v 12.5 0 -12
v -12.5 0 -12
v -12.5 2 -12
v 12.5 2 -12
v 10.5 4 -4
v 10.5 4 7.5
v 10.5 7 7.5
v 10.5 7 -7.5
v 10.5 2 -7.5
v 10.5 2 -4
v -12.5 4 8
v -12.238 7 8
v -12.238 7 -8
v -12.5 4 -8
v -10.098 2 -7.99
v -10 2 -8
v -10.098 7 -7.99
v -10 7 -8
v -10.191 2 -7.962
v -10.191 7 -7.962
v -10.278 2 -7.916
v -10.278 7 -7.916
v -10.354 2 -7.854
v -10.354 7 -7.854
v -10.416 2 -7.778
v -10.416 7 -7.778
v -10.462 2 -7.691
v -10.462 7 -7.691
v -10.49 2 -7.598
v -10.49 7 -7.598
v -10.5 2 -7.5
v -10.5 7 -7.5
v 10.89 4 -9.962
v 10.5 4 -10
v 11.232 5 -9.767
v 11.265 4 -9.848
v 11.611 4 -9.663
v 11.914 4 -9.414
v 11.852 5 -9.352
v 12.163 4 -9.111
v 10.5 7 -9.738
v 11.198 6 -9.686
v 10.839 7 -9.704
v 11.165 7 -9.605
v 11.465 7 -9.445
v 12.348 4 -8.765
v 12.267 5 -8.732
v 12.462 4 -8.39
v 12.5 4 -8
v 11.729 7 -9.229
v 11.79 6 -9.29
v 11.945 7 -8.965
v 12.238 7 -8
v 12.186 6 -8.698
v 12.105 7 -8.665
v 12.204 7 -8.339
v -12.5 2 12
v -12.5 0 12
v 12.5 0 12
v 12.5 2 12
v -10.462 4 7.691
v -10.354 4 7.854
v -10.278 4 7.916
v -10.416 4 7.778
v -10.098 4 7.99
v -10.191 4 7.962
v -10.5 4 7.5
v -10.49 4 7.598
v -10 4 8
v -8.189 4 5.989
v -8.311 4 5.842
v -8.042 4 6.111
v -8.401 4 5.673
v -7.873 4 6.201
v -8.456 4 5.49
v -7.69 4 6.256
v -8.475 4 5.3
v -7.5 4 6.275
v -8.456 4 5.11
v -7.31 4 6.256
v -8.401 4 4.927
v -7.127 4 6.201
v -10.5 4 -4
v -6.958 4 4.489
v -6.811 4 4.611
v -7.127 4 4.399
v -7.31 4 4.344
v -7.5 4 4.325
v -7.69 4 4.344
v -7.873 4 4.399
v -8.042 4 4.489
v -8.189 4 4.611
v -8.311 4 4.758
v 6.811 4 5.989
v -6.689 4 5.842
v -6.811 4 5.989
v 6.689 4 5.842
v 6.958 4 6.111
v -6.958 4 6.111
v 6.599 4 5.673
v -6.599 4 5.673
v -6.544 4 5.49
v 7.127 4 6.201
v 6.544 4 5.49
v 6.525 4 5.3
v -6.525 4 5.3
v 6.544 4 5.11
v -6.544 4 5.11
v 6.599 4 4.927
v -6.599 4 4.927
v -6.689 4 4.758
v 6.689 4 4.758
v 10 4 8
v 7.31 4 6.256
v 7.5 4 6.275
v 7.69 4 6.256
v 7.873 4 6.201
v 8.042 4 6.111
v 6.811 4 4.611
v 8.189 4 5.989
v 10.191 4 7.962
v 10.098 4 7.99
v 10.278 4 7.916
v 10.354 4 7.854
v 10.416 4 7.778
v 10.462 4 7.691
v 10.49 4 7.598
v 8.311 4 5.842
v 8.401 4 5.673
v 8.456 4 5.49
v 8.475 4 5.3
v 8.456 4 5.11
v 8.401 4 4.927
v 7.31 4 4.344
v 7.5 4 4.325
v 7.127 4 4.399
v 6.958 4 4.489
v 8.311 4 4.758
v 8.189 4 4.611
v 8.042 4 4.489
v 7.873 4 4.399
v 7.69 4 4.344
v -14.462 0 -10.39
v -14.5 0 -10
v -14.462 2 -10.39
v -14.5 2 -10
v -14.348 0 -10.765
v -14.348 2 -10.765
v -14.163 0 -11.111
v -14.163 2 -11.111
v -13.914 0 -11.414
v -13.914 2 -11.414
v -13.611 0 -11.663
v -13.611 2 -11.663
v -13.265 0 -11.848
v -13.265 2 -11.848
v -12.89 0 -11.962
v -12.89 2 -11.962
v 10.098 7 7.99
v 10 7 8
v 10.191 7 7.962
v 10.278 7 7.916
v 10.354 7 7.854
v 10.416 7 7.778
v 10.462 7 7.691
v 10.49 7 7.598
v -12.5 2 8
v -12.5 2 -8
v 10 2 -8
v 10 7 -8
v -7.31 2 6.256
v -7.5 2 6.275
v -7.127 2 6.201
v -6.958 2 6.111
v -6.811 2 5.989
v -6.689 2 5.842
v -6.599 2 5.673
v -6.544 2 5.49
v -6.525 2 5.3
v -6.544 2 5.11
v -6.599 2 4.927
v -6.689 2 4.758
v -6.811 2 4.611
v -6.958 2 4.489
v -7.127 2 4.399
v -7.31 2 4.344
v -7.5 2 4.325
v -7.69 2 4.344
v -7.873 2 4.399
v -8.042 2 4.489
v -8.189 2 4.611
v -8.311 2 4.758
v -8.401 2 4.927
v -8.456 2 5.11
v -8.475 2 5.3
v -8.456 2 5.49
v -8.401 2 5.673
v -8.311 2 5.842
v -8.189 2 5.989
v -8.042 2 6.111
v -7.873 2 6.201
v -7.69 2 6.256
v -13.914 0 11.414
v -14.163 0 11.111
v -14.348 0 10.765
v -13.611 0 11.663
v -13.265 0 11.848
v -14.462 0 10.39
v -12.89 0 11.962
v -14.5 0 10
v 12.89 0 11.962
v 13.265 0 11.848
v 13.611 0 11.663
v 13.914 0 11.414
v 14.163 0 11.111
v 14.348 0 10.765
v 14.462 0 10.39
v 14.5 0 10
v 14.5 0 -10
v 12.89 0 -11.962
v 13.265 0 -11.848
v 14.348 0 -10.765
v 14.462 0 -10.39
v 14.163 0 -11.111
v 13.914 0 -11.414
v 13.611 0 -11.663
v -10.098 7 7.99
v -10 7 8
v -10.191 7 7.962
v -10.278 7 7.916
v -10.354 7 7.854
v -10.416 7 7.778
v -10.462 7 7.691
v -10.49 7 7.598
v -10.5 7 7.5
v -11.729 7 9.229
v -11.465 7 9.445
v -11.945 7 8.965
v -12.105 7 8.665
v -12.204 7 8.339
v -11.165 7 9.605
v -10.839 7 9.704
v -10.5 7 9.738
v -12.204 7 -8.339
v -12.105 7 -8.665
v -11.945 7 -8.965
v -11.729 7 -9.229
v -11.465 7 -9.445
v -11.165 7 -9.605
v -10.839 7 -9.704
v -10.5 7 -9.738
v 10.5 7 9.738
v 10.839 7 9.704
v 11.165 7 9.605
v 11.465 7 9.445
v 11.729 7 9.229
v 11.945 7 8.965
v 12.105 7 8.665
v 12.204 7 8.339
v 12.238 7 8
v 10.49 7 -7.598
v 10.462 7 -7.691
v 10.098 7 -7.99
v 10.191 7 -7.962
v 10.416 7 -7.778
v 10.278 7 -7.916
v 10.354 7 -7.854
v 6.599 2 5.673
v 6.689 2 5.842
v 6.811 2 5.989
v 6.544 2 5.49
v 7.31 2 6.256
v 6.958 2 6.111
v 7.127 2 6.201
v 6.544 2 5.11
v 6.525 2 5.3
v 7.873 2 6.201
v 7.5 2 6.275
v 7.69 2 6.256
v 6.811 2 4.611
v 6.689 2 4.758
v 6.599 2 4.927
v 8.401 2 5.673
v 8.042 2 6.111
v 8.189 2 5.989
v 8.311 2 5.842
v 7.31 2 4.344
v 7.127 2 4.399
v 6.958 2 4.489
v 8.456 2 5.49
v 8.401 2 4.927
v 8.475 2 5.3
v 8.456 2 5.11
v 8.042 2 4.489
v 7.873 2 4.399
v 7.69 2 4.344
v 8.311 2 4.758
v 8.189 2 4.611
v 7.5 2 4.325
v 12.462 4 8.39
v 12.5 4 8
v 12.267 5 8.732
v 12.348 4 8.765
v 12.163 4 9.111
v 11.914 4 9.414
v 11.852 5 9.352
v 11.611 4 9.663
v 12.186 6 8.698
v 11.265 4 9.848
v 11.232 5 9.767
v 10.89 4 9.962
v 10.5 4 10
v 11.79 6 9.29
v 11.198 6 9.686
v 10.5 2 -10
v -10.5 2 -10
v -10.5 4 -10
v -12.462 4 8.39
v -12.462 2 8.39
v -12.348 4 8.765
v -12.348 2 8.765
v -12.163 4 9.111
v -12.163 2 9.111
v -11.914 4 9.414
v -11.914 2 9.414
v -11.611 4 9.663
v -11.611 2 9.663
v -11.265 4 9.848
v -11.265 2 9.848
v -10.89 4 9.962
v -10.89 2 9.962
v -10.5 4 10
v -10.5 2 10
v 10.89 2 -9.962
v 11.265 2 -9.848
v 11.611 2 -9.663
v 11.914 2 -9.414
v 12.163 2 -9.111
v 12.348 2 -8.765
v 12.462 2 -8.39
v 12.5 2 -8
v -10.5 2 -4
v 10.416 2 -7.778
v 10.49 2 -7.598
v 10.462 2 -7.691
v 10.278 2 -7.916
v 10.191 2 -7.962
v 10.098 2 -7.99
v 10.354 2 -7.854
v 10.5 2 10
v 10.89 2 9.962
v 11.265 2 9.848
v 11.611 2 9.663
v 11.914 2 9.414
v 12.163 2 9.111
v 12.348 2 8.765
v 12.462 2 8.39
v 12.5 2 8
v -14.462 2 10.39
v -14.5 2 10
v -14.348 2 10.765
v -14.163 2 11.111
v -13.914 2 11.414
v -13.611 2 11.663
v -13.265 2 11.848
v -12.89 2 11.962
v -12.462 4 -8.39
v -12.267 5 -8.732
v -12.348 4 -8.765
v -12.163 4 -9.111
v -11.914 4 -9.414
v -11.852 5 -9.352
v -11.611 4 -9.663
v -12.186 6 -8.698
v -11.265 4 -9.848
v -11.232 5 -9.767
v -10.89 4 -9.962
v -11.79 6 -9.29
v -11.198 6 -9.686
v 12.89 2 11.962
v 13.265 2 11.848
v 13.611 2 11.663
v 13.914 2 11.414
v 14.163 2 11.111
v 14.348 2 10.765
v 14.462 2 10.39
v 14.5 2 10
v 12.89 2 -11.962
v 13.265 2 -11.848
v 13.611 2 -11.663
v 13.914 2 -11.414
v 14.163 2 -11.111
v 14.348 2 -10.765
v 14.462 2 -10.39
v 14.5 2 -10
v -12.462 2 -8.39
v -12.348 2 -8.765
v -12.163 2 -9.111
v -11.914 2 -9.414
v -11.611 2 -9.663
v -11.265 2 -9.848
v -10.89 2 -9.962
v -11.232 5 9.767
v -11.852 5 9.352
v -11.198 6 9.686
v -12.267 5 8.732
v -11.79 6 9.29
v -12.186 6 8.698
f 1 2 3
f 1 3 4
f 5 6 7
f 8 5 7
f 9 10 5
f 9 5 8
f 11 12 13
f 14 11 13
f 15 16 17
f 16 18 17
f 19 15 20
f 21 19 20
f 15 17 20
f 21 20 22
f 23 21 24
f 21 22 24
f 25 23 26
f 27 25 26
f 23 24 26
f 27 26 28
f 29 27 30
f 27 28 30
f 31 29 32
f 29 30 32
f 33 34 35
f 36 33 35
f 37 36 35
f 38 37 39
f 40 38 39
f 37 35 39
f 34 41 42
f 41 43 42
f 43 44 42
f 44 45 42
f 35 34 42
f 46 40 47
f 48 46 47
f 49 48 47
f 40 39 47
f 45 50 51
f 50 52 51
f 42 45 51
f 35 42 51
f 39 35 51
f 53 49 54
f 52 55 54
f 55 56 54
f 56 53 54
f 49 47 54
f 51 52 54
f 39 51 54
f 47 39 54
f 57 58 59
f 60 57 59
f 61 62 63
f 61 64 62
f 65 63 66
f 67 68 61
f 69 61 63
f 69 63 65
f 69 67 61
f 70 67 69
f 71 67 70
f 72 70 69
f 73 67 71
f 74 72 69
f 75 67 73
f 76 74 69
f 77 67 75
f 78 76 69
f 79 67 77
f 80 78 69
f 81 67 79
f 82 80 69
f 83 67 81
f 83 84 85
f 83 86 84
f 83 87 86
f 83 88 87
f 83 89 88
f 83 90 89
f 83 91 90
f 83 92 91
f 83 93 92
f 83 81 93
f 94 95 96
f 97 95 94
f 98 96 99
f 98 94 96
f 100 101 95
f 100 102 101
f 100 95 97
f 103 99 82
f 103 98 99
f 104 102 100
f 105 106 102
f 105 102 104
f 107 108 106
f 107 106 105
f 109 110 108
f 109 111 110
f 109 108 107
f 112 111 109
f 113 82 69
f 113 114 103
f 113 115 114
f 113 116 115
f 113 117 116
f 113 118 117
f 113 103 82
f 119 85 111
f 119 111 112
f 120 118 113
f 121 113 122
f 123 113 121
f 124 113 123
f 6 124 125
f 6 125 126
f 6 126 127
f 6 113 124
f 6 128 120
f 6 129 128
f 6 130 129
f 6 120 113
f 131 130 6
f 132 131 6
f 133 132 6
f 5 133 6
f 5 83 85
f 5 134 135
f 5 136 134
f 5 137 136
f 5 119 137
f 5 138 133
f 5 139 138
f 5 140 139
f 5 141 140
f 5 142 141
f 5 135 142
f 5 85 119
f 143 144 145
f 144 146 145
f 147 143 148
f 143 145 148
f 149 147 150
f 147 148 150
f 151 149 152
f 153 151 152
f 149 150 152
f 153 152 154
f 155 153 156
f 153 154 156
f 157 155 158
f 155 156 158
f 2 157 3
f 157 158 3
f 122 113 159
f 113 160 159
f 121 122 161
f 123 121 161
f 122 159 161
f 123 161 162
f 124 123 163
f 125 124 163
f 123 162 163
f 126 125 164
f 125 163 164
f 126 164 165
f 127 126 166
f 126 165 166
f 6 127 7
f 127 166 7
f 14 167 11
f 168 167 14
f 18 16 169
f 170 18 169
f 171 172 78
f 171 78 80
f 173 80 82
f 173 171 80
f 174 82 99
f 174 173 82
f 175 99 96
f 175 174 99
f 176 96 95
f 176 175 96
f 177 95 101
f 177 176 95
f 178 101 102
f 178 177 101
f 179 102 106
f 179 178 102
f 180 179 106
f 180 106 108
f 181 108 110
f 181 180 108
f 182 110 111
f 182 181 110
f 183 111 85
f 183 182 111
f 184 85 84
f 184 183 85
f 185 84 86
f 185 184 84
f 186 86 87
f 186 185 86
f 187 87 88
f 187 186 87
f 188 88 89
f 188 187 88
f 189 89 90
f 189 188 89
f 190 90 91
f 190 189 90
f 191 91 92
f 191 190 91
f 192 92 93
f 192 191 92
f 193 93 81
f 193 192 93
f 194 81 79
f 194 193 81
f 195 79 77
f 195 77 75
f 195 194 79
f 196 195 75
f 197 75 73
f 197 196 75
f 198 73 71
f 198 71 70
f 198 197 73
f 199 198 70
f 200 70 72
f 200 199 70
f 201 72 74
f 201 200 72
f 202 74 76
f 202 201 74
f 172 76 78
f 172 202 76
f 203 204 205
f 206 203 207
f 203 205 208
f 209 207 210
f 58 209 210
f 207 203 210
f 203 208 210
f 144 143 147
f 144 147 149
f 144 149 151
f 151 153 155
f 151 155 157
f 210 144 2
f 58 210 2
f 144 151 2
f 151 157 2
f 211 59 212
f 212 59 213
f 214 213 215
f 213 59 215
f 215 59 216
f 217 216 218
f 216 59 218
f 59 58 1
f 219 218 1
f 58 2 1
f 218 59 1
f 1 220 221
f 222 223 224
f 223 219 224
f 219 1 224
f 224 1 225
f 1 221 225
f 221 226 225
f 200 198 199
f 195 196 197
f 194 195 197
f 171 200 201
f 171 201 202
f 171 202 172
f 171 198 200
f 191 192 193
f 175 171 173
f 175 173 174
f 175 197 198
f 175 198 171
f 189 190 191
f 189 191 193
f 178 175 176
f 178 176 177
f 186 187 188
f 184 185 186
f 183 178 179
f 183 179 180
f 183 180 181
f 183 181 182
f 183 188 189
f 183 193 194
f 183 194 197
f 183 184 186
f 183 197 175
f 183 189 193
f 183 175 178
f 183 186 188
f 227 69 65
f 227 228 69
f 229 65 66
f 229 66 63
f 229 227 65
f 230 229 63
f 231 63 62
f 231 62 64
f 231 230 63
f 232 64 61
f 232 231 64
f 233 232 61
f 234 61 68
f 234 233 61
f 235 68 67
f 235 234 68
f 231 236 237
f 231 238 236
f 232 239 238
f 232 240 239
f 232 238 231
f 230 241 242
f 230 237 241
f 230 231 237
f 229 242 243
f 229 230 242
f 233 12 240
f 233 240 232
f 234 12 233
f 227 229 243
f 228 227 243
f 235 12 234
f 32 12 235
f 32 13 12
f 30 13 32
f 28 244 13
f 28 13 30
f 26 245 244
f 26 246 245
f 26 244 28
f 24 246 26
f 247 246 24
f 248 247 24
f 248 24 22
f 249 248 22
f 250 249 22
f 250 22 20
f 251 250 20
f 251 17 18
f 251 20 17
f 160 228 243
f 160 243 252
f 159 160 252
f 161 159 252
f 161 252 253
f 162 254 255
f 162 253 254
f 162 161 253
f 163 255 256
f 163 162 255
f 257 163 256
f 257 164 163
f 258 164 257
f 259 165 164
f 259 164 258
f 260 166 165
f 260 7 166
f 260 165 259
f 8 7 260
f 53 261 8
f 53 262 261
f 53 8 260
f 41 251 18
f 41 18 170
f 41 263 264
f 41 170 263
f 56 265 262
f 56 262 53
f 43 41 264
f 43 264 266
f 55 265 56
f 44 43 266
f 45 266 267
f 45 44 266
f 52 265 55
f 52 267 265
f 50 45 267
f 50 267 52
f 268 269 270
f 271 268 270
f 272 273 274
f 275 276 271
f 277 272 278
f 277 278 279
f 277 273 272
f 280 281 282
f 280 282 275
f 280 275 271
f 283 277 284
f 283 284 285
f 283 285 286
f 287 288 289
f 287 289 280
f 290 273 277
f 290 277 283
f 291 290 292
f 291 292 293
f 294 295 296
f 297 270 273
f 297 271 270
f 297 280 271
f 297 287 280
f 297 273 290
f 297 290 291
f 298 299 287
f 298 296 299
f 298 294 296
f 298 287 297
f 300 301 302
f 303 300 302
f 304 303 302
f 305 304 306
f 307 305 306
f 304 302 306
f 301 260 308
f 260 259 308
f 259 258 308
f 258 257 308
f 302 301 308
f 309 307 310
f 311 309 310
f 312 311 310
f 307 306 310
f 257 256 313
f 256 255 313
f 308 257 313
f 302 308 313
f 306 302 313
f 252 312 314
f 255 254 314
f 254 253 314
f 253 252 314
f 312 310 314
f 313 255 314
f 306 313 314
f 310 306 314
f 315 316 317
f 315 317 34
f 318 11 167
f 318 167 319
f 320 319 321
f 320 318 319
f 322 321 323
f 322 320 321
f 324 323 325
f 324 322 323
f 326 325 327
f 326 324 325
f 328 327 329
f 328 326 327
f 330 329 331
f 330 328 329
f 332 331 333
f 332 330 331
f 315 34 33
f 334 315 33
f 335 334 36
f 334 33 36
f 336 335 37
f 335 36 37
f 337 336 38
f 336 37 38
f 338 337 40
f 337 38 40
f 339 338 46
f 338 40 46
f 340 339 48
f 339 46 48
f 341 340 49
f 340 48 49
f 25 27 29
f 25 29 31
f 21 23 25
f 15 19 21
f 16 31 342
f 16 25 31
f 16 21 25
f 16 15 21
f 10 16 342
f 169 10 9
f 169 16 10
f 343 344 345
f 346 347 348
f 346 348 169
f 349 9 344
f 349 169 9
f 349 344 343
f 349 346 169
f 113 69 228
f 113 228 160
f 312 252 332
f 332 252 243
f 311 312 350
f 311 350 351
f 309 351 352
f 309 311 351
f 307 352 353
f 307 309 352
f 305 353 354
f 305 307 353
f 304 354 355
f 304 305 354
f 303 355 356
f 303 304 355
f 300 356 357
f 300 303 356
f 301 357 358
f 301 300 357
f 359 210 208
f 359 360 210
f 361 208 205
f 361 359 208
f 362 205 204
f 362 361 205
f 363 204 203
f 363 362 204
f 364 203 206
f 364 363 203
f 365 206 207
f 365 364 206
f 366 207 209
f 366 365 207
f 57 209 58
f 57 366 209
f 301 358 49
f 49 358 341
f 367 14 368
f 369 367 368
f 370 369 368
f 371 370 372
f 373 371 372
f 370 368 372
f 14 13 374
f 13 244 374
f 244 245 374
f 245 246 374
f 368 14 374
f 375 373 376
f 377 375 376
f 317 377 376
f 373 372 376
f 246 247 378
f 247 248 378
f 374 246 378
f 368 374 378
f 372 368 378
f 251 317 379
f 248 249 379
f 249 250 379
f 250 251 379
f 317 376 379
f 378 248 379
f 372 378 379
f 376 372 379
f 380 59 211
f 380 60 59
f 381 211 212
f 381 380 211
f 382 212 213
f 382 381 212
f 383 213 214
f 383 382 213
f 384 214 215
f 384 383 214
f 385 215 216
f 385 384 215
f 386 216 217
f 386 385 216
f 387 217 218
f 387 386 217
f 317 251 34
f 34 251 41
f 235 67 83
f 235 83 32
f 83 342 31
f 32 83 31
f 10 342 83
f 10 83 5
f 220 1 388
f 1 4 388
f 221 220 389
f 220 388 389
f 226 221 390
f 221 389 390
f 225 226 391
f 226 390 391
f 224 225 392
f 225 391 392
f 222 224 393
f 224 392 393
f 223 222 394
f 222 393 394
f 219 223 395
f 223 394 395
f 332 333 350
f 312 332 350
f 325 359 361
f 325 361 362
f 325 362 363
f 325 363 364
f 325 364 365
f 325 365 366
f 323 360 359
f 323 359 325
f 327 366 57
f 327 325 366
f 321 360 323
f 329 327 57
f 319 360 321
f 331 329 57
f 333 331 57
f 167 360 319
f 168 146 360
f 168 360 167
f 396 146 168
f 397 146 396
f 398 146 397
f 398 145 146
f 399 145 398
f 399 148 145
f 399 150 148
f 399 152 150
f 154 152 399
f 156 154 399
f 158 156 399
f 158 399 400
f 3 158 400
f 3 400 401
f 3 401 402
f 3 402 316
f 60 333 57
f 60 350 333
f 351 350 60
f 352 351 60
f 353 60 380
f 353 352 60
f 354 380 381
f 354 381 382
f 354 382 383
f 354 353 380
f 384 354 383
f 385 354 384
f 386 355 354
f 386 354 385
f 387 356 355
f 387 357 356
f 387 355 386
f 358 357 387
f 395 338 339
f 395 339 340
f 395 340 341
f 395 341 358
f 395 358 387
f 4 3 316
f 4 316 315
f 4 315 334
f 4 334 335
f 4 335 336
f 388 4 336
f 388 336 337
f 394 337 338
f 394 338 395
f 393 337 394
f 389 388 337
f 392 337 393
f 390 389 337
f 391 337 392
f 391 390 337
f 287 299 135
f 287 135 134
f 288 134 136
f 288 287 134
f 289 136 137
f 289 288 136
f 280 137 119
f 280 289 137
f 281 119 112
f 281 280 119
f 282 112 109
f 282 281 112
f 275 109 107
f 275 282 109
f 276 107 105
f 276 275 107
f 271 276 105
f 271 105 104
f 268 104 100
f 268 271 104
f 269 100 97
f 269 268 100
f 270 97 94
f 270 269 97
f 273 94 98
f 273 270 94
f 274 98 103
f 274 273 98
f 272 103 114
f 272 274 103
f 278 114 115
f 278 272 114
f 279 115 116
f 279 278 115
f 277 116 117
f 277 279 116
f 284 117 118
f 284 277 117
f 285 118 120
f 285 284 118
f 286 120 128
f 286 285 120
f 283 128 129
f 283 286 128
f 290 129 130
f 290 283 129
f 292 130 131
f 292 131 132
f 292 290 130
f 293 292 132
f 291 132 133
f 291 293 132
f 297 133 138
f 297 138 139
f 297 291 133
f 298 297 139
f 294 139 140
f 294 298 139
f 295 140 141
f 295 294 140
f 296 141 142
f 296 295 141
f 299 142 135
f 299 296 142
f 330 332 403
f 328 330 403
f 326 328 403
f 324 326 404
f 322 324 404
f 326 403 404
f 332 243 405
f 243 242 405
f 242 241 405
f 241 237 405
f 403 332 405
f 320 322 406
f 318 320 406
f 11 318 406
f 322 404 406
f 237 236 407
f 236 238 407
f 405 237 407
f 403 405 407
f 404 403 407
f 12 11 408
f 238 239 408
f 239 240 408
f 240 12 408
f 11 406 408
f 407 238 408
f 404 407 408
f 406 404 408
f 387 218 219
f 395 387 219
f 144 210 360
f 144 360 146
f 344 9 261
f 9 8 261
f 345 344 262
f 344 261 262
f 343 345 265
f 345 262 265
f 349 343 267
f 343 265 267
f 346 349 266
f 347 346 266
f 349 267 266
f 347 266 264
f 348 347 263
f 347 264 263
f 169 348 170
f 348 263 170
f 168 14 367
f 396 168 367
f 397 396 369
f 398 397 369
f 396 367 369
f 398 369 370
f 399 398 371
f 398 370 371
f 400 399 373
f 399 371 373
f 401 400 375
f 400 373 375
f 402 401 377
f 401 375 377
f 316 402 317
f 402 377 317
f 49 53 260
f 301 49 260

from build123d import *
from OCP.BRepFilletAPI import BRepFilletAPI_MakeChamfer

# Parameters (mm, degrees)
SKETCH1_W           = 29
SKETCH1_H           = 24
BOSS_EXTRUDE1_DEPTH = 2
SKETCH2_W           = 25
SKETCH2_H           = 20
SKETCH2_W_2         = 21
SKETCH2_H_2         = 16
BOSS_EXTRUDE2_DEPTH = 5
SKETCH3_W           = 21
SKETCH3_H           = 12
SKETCH3_R           = 0.975
BOSS_EXTRUDE3_DEPTH = 2
FILLET1_R           = 2
FILLET5_R           = 0.5
CHAMFER1_SIZE       = 3
CHAMFER1_SIZE2      = 0.262465991


with BuildPart() as part:
    # Sketch1 → Boss-Extrude1 (new body)
    with BuildSketch(Plane(origin=(0, 0, 0), x_dir=(1, 0, 0), z_dir=(0, 1, 0))):
        Rectangle(SKETCH1_W, SKETCH1_H)
    extrude(amount=BOSS_EXTRUDE1_DEPTH)

    # Sketch2 → Boss-Extrude2 (add)
    with BuildSketch(Plane(origin=(0, 2, 0), x_dir=(1, 0, 0), z_dir=(0, 1, 0))):
        Rectangle(SKETCH2_W, SKETCH2_H)
        Rectangle(SKETCH2_W_2, SKETCH2_H_2, mode=Mode.SUBTRACT)
    extrude(amount=BOSS_EXTRUDE2_DEPTH)

    # Sketch3 → Boss-Extrude3 (add)
    with BuildSketch(Plane(origin=(0, 2, 0), x_dir=(1, 0, 0), z_dir=(0, 1, 0))):
        with Locations((0, -2)):
            Rectangle(SKETCH3_W, SKETCH3_H)
        with Locations(Location((-7.5, -5.3, 0), (0, 0, 270))):
            Circle(SKETCH3_R, mode=Mode.SUBTRACT)
        with Locations(Location((7.5, -5.3, 0), (0, 0, 90))):
            Circle(SKETCH3_R, mode=Mode.SUBTRACT)
    extrude(amount=BOSS_EXTRUDE3_DEPTH)

    # Fillet1
    fillet1_edges = [part.edges().sort_by_distance(p)[0] for p in [
        (-12.5, 4.5, -10),
        (-12.5, 4.5, 10),
        (12.5, 4.5, 10),
        (12.5, 4.5, -10),
        (14.5, 1, 12),
        (-14.5, 1, 12),
        (-14.5, 1, -12),
        (14.5, 1, -12),
    ]]
    fillet(fillet1_edges, radius=FILLET1_R)

    # Fillet5
    fillet5_edges = [part.edges().sort_by_distance(p)[0] for p in [
        (10.5, 4.5, -8),
        (-10.5, 4.5, -8),
        (-10.5, 5.5, 8),
        (10.5, 5.5, 8),
    ]]
    fillet(fillet5_edges, radius=FILLET5_R)

    # Chamfer1: one chamfer whose edges measure the first distance from different faces: ONE call of the kernel's chamfer builder (chamfer() names one face for all edges)
    chamfer1_edges_1 = [part.edges().sort_by_distance(p)[0] for p in [
        (0, 7, -10),
    ]]
    chamfer1_side_1 = [part.faces().sort_by_distance(p)[0] for p in [
        (0, 4.5, -10),
    ]]
    chamfer1_edges_2 = [part.edges().sort_by_distance(p)[0] for p in [
        (12.5, 7, 0),
    ]]
    chamfer1_side_2 = [part.faces().sort_by_distance(p)[0] for p in [
        (12.5, 4.5, 0),
    ]]
    chamfer1_edges_3 = [part.edges().sort_by_distance(p)[0] for p in [
        (-12.5, 7, 0),
    ]]
    chamfer1_side_3 = [part.faces().sort_by_distance(p)[0] for p in [
        (-12.5, 4.5, 0),
    ]]
    chamfer1_edges_4 = [part.edges().sort_by_distance(p)[0] for p in [
        (0, 7, 10),
    ]]
    chamfer1_side_4 = [part.faces().sort_by_distance(p)[0] for p in [
        (0, 4.5, 10),
    ]]
    chamfer1_edges_5 = [part.edges().sort_by_distance(p)[0] for p in [
        (-11.914213562, 7, -9.414213562),
    ]]
    chamfer1_side_5 = [part.faces().sort_by_distance(p)[0] for p in [
        (-11.914213562, 4.5, -9.414213562),
    ]]
    chamfer1_edges_6 = [part.edges().sort_by_distance(p)[0] for p in [
        (-11.914213562, 7, 9.414213562),
    ]]
    chamfer1_side_6 = [part.faces().sort_by_distance(p)[0] for p in [
        (-11.914213562, 4.5, 9.414213562),
    ]]
    chamfer1_edges_7 = [part.edges().sort_by_distance(p)[0] for p in [
        (11.914213562, 7, 9.414213562),
    ]]
    chamfer1_side_7 = [part.faces().sort_by_distance(p)[0] for p in [
        (11.914213562, 4.5, 9.414213562),
    ]]
    chamfer1_edges_8 = [part.edges().sort_by_distance(p)[0] for p in [
        (11.914213562, 7, -9.414213562),
    ]]
    chamfer1_side_8 = [part.faces().sort_by_distance(p)[0] for p in [
        (11.914213562, 4.5, -9.414213562),
    ]]
    chamfer1 = BRepFilletAPI_MakeChamfer(part.part.solid().wrapped)
    for e in chamfer1_edges_1:
        chamfer1.Add(CHAMFER1_SIZE, CHAMFER1_SIZE2, e.wrapped, chamfer1_side_1[0].wrapped)  # the first distance lies on this face
    for e in chamfer1_edges_2:
        chamfer1.Add(CHAMFER1_SIZE, CHAMFER1_SIZE2, e.wrapped, chamfer1_side_2[0].wrapped)  # the first distance lies on this face
    for e in chamfer1_edges_3:
        chamfer1.Add(CHAMFER1_SIZE, CHAMFER1_SIZE2, e.wrapped, chamfer1_side_3[0].wrapped)  # the first distance lies on this face
    for e in chamfer1_edges_4:
        chamfer1.Add(CHAMFER1_SIZE, CHAMFER1_SIZE2, e.wrapped, chamfer1_side_4[0].wrapped)  # the first distance lies on this face
    for e in chamfer1_edges_5:
        chamfer1.Add(CHAMFER1_SIZE, CHAMFER1_SIZE2, e.wrapped, chamfer1_side_5[0].wrapped)  # the first distance lies on this face
    for e in chamfer1_edges_6:
        chamfer1.Add(CHAMFER1_SIZE, CHAMFER1_SIZE2, e.wrapped, chamfer1_side_6[0].wrapped)  # the first distance lies on this face
    for e in chamfer1_edges_7:
        chamfer1.Add(CHAMFER1_SIZE, CHAMFER1_SIZE2, e.wrapped, chamfer1_side_7[0].wrapped)  # the first distance lies on this face
    for e in chamfer1_edges_8:
        chamfer1.Add(CHAMFER1_SIZE, CHAMFER1_SIZE2, e.wrapped, chamfer1_side_8[0].wrapped)  # the first distance lies on this face
    add(Compound.cast(chamfer1.Shape()), mode=Mode.REPLACE)


solid = part.part
